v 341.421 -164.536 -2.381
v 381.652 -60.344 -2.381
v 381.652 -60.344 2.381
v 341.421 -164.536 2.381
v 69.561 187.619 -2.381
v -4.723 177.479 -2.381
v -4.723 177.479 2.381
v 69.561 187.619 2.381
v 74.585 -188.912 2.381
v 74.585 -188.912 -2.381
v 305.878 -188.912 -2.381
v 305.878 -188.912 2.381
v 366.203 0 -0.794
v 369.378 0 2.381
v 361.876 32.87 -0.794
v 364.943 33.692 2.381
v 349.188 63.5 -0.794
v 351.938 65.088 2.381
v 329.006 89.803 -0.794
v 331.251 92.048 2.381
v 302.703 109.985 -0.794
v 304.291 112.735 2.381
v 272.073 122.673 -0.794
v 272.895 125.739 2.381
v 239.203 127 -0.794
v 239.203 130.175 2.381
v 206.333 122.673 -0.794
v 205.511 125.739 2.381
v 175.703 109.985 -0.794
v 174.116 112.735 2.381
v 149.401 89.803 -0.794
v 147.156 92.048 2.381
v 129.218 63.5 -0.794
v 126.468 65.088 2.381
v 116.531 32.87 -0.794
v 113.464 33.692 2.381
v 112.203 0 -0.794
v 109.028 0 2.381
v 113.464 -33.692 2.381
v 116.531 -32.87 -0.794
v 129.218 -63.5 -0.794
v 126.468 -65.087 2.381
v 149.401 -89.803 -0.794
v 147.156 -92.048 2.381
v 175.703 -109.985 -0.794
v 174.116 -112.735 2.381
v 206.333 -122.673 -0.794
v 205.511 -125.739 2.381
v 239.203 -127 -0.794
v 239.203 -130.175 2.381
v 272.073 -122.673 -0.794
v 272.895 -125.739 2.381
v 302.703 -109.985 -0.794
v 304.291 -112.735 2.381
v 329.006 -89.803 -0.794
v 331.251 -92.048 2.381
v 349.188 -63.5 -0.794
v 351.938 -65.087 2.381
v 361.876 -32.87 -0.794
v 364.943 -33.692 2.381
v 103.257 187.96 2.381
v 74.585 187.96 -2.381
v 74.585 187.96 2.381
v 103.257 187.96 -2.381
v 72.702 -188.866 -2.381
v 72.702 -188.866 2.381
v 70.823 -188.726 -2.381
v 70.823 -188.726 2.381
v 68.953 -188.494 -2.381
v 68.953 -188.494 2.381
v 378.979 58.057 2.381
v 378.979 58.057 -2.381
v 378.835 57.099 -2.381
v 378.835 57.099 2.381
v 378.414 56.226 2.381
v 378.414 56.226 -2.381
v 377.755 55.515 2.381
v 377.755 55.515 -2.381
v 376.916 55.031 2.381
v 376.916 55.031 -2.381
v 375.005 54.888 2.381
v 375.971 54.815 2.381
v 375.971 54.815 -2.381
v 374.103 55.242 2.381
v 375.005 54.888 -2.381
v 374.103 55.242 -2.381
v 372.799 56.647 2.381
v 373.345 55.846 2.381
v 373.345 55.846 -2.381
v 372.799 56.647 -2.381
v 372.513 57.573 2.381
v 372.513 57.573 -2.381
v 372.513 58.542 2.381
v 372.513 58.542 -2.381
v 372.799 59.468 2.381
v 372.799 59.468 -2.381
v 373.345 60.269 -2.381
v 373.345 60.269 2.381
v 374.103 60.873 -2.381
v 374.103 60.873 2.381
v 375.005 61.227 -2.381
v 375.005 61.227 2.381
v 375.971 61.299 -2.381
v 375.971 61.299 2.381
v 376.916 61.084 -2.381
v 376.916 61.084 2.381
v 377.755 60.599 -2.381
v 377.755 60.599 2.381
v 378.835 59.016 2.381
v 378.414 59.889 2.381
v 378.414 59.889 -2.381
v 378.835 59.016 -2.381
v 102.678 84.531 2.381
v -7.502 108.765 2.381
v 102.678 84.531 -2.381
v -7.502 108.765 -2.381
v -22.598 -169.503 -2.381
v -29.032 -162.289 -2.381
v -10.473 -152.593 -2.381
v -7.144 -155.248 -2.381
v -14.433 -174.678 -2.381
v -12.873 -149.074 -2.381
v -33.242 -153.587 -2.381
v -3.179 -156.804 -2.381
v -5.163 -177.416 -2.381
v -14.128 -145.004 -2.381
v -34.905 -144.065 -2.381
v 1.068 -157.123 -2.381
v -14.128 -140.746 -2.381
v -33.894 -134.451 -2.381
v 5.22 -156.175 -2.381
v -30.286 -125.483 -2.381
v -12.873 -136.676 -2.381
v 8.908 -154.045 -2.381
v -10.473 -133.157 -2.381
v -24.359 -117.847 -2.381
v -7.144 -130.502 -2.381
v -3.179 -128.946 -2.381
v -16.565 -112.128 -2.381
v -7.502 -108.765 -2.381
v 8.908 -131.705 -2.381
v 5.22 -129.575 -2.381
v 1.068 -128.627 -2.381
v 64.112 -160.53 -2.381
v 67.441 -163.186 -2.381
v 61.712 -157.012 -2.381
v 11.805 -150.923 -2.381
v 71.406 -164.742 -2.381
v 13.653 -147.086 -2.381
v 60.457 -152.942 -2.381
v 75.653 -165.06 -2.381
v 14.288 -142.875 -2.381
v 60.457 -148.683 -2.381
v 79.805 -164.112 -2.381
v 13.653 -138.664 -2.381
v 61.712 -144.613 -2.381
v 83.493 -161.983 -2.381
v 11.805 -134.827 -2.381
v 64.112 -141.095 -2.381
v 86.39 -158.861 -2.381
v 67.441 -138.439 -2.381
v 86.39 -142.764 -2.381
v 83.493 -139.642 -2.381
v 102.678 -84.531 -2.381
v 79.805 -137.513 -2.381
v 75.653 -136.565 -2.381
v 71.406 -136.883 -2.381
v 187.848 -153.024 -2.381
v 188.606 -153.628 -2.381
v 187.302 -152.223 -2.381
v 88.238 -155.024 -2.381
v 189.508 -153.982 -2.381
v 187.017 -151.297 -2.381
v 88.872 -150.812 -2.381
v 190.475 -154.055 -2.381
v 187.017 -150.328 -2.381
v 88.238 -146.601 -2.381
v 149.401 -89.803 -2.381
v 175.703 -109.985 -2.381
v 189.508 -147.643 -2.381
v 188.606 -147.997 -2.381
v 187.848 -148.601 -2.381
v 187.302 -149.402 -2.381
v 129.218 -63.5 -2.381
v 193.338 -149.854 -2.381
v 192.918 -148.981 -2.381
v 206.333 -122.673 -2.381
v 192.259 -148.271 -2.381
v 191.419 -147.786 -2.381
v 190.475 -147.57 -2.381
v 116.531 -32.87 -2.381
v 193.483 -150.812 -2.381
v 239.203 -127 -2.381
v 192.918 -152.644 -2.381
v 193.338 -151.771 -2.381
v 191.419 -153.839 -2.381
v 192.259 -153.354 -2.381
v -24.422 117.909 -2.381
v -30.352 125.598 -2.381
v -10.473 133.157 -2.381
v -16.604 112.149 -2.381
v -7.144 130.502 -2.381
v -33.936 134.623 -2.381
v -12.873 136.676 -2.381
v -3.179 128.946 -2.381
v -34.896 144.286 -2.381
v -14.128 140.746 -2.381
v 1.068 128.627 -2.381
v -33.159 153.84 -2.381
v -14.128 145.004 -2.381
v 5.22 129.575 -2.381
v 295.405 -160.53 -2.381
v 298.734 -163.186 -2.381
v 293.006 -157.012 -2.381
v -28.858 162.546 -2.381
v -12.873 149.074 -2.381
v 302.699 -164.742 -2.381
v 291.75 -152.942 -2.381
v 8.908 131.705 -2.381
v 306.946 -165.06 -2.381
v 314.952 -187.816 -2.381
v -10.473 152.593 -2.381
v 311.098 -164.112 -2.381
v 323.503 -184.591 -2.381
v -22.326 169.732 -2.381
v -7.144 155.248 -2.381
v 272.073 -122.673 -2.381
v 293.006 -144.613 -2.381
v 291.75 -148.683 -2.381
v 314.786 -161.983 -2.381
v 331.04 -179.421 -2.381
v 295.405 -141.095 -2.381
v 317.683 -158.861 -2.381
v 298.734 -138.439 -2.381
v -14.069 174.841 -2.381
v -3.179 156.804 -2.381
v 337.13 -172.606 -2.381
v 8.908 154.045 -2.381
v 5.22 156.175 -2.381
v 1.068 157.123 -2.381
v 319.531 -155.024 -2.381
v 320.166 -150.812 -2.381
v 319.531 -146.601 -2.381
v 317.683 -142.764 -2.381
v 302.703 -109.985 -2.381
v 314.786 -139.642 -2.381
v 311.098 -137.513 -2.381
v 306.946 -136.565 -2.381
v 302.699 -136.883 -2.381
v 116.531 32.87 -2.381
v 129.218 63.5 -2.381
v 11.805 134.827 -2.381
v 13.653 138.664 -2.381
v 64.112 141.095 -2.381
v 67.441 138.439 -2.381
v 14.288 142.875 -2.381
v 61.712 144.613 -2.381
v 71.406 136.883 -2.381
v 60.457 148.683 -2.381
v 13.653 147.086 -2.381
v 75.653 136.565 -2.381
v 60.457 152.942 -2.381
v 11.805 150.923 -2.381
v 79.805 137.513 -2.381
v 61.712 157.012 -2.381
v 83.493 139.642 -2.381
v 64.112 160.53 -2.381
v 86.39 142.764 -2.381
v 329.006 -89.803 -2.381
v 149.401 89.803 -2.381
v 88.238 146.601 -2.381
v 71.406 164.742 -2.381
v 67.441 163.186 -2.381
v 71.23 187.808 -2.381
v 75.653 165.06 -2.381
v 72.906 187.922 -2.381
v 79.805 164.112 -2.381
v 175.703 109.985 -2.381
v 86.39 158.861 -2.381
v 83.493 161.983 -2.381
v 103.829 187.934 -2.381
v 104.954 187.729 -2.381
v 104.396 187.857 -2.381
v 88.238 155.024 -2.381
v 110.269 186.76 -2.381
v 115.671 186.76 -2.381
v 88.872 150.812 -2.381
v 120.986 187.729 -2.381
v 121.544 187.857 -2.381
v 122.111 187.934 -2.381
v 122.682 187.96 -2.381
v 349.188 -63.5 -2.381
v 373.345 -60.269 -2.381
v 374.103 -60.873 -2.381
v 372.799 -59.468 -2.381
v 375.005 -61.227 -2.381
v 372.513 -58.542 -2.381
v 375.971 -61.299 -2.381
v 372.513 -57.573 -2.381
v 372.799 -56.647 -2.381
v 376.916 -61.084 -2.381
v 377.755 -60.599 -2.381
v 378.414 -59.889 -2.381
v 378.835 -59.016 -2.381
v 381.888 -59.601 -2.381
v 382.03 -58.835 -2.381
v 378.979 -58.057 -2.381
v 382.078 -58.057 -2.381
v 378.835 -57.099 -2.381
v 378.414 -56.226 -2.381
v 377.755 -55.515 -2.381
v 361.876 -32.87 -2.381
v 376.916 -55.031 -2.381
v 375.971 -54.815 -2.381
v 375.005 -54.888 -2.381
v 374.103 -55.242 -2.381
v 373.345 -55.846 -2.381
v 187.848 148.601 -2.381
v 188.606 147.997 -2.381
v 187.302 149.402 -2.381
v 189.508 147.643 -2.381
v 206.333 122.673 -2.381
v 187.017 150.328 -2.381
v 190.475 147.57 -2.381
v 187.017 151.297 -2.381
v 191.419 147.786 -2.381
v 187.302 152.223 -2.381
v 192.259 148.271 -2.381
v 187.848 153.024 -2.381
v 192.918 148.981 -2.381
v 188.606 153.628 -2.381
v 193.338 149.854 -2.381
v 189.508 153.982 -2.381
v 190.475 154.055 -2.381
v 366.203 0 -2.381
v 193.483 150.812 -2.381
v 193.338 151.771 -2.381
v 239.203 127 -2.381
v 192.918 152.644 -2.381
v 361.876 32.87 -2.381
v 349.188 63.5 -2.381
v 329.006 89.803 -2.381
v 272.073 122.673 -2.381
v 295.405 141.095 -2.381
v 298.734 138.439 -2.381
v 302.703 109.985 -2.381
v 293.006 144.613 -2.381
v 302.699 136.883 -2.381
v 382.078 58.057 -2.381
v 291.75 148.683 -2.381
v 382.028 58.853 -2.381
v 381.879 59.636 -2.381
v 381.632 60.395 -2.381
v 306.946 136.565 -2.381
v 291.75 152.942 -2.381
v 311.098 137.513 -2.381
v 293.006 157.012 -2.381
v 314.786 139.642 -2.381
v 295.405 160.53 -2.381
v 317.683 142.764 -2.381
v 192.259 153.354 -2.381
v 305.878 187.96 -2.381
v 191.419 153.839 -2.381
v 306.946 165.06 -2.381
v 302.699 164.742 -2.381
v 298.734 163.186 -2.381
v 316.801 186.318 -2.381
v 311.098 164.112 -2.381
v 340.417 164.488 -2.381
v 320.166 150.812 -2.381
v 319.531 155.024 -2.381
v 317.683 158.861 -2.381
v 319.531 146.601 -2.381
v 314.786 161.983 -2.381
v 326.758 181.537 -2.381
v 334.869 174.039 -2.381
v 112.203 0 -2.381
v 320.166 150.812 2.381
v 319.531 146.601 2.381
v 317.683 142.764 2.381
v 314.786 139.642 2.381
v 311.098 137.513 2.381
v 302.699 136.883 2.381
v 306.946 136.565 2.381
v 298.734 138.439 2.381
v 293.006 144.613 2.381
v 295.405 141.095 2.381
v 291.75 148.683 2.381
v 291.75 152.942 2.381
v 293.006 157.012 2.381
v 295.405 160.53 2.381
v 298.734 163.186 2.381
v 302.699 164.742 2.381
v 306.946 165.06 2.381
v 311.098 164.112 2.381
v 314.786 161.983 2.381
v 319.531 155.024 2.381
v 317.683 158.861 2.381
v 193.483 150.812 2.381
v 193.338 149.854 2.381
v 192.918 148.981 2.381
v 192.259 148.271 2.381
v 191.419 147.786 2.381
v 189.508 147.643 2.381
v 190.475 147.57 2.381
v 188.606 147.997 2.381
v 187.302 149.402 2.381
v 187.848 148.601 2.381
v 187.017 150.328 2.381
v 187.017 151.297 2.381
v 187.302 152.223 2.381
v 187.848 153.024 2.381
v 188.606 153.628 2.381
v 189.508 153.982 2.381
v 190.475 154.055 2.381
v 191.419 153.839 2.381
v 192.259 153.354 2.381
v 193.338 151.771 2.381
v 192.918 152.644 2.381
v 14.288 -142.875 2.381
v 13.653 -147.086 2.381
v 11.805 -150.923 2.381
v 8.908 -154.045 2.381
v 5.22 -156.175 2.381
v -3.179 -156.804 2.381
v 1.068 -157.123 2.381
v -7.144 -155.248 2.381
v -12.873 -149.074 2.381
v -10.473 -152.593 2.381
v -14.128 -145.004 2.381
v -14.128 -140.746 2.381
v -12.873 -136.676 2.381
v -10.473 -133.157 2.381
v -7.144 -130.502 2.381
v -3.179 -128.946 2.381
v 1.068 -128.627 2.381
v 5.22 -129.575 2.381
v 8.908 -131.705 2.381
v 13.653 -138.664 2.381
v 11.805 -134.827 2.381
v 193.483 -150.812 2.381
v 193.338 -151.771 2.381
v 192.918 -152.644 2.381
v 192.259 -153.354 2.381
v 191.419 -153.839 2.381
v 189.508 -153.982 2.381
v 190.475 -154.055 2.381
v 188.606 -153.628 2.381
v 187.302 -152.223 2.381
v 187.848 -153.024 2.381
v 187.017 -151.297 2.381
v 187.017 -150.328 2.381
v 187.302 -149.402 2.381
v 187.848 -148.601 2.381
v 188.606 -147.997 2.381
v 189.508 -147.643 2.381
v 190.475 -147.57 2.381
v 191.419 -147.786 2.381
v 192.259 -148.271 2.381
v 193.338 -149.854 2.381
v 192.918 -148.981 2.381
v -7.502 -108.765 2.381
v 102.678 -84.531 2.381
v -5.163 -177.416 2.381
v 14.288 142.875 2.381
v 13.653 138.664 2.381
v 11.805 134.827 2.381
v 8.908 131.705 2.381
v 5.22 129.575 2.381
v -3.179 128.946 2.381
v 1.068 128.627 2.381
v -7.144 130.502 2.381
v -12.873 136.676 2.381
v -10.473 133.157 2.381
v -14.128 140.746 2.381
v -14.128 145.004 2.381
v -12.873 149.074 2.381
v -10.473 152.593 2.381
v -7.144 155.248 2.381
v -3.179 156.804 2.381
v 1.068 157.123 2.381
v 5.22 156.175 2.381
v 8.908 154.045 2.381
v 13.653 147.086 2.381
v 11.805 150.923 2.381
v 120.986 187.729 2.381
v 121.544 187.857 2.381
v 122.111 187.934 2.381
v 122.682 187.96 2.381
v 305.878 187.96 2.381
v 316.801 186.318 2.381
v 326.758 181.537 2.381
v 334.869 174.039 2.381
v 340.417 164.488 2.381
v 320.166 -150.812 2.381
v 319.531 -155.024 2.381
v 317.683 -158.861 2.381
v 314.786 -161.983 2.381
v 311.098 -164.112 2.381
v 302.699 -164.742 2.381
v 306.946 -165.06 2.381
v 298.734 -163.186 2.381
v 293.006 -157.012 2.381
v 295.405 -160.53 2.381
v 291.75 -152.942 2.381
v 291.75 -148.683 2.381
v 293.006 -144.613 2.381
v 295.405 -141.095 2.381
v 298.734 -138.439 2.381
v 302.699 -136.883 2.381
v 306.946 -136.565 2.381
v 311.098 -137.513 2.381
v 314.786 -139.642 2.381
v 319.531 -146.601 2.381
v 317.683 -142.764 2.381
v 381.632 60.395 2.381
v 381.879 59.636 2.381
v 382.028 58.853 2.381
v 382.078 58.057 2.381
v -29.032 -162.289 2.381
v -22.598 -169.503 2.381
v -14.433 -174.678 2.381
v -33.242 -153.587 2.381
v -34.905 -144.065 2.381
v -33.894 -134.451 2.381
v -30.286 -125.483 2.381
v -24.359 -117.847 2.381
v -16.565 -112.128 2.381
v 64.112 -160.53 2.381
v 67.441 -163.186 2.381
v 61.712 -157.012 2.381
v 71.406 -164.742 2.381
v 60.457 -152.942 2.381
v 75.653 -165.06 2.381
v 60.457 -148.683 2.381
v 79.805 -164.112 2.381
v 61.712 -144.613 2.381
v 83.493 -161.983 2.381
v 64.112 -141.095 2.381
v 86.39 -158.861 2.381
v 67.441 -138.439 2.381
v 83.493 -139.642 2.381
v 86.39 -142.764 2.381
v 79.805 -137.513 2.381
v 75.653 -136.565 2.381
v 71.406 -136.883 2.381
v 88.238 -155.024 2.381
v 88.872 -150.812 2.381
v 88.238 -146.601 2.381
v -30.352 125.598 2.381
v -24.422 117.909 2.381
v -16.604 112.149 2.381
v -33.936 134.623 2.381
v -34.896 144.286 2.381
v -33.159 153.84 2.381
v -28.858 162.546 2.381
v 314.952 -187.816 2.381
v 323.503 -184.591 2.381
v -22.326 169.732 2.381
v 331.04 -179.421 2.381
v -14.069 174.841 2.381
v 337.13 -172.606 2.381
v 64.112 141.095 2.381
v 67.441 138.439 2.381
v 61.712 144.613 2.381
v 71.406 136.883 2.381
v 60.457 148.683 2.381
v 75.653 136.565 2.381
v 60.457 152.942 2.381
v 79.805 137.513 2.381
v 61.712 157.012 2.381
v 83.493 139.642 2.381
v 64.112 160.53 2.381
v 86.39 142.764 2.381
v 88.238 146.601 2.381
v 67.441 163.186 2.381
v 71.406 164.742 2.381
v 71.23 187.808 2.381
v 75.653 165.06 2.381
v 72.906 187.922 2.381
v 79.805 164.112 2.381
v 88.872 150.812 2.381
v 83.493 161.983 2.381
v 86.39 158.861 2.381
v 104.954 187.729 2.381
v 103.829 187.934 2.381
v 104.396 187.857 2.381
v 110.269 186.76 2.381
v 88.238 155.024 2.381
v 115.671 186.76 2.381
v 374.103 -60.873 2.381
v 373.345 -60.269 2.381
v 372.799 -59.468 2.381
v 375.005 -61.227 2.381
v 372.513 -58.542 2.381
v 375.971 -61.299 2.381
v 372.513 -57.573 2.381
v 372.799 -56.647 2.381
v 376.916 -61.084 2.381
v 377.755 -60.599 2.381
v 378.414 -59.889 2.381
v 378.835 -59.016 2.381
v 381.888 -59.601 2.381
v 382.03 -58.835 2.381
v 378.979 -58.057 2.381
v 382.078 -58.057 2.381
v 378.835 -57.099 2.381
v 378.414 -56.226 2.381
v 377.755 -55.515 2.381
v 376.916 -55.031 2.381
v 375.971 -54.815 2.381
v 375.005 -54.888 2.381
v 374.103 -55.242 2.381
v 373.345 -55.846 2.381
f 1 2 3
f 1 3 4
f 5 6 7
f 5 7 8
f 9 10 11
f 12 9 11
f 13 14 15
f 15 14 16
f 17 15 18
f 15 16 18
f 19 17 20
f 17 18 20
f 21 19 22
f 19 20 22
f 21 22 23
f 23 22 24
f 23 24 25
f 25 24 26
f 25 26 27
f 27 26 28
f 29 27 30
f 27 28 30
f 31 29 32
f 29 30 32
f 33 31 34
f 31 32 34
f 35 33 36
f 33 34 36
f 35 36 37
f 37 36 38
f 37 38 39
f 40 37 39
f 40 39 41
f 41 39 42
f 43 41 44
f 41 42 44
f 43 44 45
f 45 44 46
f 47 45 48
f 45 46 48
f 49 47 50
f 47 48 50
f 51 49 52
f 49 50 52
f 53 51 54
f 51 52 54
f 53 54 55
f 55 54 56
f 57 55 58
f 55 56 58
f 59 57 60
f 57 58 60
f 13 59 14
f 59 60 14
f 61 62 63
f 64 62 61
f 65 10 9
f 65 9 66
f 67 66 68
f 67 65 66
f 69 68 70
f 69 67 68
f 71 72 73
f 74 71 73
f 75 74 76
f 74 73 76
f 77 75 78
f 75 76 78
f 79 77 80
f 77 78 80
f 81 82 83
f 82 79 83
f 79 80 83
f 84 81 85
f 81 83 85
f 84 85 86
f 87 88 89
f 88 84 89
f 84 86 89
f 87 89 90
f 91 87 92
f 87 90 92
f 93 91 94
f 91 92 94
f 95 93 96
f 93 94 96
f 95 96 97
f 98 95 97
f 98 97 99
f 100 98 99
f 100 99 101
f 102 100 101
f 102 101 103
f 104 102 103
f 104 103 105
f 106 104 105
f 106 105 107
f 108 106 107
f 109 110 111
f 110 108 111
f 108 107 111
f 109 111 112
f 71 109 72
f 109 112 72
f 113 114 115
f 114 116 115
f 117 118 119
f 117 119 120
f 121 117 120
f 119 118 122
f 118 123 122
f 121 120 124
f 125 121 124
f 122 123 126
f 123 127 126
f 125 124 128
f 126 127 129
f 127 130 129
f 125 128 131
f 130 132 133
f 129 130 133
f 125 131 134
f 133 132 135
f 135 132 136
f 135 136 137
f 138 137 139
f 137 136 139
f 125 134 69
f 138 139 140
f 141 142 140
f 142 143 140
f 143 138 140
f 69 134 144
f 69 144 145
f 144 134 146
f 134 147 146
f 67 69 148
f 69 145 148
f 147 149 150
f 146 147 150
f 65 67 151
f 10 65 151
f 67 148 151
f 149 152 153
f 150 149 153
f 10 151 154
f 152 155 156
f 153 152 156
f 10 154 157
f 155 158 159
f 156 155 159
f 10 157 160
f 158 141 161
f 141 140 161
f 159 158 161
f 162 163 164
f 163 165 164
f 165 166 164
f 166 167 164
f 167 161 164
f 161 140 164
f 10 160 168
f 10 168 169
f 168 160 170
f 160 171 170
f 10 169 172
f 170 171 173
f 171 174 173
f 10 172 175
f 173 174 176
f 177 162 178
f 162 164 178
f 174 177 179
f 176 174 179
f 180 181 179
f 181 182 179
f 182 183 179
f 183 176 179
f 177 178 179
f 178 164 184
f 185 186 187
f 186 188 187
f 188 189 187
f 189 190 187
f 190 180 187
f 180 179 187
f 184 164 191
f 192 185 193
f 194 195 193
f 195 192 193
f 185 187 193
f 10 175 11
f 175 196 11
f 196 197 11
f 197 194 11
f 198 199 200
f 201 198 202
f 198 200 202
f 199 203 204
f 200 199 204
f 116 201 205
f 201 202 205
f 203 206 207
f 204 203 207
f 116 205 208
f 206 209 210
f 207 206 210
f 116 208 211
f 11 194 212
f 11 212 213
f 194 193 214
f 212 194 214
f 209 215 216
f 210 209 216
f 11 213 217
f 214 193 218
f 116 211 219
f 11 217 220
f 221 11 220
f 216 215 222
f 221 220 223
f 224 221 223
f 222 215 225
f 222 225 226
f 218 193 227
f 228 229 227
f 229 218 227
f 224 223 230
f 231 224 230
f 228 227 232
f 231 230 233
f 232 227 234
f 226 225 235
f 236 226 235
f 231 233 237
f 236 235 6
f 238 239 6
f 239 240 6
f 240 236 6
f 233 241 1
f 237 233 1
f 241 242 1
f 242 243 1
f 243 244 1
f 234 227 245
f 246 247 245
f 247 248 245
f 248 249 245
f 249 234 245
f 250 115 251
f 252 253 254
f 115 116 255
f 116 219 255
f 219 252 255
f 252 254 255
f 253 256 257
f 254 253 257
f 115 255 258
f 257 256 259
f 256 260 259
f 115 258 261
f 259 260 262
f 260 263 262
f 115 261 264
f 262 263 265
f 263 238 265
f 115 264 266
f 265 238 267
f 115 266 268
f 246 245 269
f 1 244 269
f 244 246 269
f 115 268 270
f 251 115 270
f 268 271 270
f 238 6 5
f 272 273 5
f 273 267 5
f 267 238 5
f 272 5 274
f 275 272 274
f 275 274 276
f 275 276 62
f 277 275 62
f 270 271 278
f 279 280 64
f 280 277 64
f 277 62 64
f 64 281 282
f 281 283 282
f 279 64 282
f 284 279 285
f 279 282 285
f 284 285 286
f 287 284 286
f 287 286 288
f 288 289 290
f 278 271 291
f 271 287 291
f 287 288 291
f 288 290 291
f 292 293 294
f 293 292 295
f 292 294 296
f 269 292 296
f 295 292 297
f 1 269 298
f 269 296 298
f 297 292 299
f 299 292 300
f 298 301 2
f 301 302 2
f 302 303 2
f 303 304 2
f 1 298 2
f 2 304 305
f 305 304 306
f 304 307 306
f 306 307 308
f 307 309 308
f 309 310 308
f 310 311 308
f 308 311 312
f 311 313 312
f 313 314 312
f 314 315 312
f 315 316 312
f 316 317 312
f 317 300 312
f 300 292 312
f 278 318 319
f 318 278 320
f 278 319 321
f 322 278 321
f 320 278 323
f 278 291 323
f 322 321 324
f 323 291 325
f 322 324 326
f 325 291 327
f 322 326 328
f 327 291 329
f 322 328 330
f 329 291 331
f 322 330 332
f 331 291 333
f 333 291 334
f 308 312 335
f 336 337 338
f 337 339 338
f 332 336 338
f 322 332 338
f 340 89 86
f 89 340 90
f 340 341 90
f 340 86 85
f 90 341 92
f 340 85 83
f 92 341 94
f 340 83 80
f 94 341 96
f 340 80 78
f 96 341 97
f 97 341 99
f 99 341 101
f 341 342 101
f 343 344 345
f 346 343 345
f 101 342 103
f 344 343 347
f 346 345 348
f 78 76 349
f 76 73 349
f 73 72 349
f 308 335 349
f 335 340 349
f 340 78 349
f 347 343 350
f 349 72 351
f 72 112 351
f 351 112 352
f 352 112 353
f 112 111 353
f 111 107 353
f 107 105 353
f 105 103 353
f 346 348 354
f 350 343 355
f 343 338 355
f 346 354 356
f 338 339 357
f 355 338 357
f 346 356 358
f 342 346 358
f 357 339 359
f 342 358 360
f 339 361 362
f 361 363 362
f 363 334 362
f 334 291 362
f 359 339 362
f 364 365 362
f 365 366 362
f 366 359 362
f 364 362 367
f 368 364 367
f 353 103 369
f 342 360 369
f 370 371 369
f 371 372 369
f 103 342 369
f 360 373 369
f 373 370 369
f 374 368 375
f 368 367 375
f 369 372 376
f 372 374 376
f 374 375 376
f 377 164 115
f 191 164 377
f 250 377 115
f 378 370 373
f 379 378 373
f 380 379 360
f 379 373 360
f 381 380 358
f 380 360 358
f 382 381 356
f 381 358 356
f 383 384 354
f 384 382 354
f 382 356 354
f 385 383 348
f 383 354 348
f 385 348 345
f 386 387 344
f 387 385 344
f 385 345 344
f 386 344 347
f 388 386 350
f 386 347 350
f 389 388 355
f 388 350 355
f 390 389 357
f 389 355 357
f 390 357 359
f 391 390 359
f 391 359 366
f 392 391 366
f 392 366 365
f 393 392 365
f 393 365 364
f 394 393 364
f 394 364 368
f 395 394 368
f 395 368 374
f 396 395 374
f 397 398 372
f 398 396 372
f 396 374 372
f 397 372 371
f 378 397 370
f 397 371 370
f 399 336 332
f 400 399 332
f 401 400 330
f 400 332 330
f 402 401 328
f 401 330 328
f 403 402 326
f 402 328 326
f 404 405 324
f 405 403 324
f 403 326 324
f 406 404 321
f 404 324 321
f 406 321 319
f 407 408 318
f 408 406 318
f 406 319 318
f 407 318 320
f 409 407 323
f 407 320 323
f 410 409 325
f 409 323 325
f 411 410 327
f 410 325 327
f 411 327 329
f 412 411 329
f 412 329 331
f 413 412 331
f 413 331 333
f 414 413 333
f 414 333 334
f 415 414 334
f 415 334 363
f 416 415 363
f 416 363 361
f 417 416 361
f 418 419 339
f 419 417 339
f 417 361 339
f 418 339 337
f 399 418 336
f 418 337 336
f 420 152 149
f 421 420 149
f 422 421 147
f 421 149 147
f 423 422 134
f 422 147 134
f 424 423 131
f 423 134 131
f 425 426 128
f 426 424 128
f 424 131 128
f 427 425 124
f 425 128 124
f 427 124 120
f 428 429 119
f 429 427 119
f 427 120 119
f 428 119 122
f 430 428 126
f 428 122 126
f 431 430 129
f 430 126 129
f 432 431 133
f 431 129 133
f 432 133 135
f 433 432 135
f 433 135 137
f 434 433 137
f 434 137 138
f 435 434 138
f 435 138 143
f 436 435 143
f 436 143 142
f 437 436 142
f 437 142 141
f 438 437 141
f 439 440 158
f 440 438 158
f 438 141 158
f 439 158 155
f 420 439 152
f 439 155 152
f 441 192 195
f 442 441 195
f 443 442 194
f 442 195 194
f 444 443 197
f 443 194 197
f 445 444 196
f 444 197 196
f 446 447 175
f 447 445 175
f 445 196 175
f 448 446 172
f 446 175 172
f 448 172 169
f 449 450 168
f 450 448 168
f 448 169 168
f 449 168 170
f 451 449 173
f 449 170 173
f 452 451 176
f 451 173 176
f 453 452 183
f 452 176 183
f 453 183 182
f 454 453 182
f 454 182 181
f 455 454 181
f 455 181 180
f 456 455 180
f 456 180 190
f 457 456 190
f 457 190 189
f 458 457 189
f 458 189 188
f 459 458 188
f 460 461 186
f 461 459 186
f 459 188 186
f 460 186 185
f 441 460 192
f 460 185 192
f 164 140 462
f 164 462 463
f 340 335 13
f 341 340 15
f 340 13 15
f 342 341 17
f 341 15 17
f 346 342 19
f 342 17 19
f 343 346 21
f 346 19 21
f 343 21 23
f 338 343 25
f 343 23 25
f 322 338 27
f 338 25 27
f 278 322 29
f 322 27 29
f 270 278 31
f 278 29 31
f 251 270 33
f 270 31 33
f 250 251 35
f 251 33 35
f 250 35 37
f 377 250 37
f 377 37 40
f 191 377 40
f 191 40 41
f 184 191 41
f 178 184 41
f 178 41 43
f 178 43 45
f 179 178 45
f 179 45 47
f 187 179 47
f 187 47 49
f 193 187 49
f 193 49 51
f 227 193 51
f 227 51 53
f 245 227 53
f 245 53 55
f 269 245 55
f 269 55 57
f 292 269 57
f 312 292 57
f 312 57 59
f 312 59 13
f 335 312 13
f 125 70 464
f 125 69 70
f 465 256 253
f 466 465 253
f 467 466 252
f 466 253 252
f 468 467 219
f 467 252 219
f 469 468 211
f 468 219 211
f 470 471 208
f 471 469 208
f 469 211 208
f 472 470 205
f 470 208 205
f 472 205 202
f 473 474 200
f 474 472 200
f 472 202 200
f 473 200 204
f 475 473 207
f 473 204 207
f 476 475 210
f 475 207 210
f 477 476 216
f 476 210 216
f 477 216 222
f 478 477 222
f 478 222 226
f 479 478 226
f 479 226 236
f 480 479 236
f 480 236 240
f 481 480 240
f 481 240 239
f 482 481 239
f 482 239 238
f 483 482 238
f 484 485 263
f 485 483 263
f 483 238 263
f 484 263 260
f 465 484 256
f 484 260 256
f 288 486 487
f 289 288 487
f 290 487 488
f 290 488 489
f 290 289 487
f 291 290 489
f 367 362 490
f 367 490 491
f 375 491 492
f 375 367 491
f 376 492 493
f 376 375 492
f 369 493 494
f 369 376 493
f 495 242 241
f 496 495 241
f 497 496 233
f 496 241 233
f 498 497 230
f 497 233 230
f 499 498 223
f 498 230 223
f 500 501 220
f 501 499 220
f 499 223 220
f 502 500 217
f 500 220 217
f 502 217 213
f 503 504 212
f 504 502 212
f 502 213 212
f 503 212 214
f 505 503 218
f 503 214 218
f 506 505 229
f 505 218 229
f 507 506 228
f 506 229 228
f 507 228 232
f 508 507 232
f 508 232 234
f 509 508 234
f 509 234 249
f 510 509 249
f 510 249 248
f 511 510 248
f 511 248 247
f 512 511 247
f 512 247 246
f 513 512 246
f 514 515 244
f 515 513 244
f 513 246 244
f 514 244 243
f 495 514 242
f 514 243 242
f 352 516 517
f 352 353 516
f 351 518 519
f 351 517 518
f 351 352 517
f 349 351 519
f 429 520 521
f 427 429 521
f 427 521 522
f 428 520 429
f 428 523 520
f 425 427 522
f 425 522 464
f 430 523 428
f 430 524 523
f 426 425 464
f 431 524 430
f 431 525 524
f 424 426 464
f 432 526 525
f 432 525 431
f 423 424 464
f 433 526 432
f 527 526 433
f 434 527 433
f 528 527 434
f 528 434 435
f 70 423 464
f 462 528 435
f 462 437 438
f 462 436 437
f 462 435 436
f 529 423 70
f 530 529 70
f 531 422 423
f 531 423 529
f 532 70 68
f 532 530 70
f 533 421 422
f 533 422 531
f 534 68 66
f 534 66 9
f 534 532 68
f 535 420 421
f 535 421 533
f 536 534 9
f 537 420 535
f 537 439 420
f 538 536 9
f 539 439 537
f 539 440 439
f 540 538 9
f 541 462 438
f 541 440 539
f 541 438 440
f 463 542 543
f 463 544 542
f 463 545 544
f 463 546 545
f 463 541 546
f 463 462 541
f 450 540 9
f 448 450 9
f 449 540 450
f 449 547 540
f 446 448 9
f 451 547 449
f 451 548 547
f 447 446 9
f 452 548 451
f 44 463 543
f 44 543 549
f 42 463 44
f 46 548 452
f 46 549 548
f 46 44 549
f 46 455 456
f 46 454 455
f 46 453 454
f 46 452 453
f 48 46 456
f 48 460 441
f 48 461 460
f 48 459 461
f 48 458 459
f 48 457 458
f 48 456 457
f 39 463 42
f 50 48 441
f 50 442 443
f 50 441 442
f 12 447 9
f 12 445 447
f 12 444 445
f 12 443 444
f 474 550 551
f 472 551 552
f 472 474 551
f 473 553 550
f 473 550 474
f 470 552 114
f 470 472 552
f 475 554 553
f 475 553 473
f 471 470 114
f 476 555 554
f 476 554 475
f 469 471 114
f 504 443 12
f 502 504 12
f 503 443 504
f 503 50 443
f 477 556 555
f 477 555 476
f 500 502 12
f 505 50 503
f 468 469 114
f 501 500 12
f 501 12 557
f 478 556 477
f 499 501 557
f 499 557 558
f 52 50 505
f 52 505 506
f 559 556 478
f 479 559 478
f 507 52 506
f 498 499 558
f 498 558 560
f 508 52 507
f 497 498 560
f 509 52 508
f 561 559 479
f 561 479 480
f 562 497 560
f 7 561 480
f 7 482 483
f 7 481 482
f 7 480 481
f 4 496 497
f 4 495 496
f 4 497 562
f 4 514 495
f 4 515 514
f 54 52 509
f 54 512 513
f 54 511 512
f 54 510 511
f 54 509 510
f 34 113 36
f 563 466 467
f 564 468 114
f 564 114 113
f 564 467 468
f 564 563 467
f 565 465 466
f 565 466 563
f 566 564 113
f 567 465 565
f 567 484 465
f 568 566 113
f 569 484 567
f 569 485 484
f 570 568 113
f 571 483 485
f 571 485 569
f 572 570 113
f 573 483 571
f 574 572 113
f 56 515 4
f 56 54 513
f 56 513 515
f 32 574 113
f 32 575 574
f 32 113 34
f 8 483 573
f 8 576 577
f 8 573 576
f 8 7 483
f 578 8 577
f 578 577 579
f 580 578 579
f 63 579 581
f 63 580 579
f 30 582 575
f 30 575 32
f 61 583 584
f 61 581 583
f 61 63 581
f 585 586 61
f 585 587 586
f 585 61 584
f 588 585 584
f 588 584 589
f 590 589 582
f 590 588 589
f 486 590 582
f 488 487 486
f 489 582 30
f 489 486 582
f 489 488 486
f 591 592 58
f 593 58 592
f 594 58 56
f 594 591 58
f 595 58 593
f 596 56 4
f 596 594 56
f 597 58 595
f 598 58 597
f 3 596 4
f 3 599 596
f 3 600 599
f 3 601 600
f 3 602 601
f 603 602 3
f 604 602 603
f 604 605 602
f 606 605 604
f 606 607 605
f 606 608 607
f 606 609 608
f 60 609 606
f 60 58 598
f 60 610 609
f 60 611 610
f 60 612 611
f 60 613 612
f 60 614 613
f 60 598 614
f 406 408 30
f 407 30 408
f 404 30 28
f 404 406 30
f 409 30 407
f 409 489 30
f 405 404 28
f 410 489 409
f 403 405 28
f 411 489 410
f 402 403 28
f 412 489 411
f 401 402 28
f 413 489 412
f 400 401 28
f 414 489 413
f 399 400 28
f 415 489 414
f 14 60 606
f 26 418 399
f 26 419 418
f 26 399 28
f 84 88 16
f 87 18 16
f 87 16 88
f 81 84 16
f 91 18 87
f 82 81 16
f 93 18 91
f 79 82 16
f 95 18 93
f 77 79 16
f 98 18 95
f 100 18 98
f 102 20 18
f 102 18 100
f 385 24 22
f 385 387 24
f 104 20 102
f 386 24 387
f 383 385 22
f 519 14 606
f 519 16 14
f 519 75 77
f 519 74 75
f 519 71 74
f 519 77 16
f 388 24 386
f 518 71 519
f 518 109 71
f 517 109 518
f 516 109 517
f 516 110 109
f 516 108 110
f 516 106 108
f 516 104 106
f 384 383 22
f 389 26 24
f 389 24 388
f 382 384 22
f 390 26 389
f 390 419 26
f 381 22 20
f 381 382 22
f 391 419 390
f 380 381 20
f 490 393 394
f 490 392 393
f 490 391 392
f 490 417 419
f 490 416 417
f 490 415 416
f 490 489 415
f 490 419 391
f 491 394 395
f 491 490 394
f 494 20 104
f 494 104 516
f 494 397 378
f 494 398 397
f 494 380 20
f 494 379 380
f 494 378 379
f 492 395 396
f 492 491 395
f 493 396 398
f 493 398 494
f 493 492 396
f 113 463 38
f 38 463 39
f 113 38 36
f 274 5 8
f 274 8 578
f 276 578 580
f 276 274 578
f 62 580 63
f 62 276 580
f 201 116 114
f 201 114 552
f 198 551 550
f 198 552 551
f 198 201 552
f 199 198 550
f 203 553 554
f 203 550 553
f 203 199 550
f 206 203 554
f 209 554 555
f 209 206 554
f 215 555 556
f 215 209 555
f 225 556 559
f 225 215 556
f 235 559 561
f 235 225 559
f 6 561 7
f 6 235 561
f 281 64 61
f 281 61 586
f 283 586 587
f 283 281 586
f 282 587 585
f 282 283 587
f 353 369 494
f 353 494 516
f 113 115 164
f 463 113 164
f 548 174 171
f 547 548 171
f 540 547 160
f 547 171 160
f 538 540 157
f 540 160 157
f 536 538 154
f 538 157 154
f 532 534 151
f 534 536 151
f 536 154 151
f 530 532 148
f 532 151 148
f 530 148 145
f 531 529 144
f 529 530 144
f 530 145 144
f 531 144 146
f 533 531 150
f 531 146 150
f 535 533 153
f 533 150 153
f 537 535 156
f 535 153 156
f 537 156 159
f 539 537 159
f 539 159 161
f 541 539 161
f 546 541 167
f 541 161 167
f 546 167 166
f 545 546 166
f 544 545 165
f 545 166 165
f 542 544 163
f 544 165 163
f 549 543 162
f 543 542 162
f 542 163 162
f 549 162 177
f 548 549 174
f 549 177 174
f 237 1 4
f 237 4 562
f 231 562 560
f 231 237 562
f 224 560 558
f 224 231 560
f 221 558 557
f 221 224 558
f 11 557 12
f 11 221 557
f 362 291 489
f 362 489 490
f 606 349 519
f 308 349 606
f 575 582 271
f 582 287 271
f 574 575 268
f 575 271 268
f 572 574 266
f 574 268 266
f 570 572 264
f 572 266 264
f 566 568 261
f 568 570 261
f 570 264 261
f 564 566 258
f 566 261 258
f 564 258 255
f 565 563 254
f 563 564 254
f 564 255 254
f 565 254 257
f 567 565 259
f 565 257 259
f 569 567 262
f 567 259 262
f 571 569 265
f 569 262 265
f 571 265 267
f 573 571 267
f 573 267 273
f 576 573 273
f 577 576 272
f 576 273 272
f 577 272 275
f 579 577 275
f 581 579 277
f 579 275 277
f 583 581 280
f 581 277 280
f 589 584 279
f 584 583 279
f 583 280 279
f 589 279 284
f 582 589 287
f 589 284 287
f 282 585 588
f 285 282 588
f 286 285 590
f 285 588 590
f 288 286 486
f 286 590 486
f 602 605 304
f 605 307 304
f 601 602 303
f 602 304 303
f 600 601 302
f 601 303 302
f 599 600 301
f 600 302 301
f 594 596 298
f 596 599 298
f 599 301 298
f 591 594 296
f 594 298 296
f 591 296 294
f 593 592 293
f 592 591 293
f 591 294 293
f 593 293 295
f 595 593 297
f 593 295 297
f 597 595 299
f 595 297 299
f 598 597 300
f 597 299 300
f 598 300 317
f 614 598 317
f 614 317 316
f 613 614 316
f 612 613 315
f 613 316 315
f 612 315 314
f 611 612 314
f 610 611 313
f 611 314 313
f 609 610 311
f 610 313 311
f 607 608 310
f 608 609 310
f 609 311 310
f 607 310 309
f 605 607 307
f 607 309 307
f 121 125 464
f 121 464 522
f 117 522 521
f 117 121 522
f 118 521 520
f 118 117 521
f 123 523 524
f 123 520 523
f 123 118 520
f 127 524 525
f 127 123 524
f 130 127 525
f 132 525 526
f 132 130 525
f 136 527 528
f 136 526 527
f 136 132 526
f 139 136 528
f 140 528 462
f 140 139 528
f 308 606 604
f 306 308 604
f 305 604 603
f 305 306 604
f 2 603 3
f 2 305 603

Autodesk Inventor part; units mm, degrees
ref_plane "YZ Plane" through (0, 0, 0) normal (1, 0, 0) x (0, 1, 0)
ref_plane "XZ Plane" through (0, 0, 0) normal (0, 1, 0) x (-1, 0, 0)
ref_plane "XY Plane" through (0, 0, 0) normal (0, 0, 1) x (1, 0, 0)
sketch "Sketch1" plane through (0, 0, 0) normal (0, 0, 1) x (1, 0, 0)
  circle A0 centre (0, 142.875) radius 63.5 construction
  circle A1 centre (0, 142.875) radius 25.4 construction
  circle A2 centre (0, -142.875) radius 25.4 construction
  circle A3 centre (0, -142.875) radius 63.5 construction
  line L0 (0, 79.375) -> (0, 79.375) construction
  line L1 (0, -79.375) -> (0, -79.375) construction
  line L2 (0, 0) -> (229.6782, 0) construction
  line L3 (0, 142.875) -> (305.8782, 142.875) construction
  line L4 (305.8782, 142.875) -> (305.8782, -142.875) construction
  line L5 (305.8782, -142.875) -> (0, -142.875) construction
  circle A4 centre (229.6782, 0) radius 127 construction
  circle A5 centre (0, 142.875) radius 14.2875
  circle A6 centre (0, -142.875) radius 14.2875
  circle A7 centre (0, 142.875) radius 34.925 construction
  circle A8 centre (0, -142.875) radius 34.925 construction
  circle A9 centre (74.585, -150.8125) radius 22.225 construction
  circle A10 centre (74.585, -150.8125) radius 33.3375 construction
  circle A11 centre (74.585, -150.8125) radius 11.1125 construction
  line L6 (74.585, -139.7) -> (74.585, -128.5875) construction
  line L7 (74.585, -117.475) -> (74.585, -128.5875) construction
  circle A12 centre (305.8782, -150.8125) radius 33.3375 construction
  circle A13 centre (305.8782, -150.8125) radius 14.2875
  circle A14 centre (375.7282, 58.0572) radius 6.35 construction
  circle A15 centre (375.7282, -58.0572) radius 6.35 construction
  line L8 (305.8782, 150.8125) -> (375.7282, 58.0572) construction
  line L9 (375.7282, 58.0572) -> (375.7282, -58.0572) construction
  line L10 (375.7282, -58.0572) -> (305.8782, -150.8125) construction
  line L11 (-117.6668, 84.5312) -> (102.6782, 84.5312) construction
  line L12 (102.6782, 84.5312) -> (102.6782, -84.5312) construction
  line L13 (102.6782, -84.5312) -> (-117.6668, -84.5312) construction
  line L14 (-117.6668, -84.5312) -> (-117.6668, 84.5312) construction
  line L15 (0, 142.875) -> (0, 84.5312) construction
  line L16 (0, -84.5312) -> (0, -142.875) construction
  circle A16 centre (74.585, -150.8125) radius 14.2875
  line L17 (74.585, -117.475) -> (305.8782, -117.475) construction
  circle A17 centre (74.585, 0) radius 127 construction
  circle A18 centre (0, 0) radius 127 construction
  circle A19 centre (0, 142.875) radius 6.35 construction
  circle A20 centre (74.585, 150.8125) radius 33.3375 construction
  circle A21 centre (305.8782, 150.8125) radius 33.3375 construction
  circle A22 centre (305.8782, 150.8125) radius 14.2875
  circle A23 centre (74.585, 150.8125) radius 14.2875
  circle A24 centre (74.585, 150.8125) radius 37.1475 construction
  circle A25 centre (305.8782, 150.8125) radius 37.1475 construction
  circle A26 centre (305.8782, -150.8125) radius 38.1 construction
  circle A27 centre (74.585, -150.8125) radius 38.1 construction
  line L18 (-4.7233, 177.4791) -> (69.5611, 187.6187)
  line L19 (74.585, 187.96) -> (305.8782, 187.96)
  line L20 (340.4169, 164.488) -> (381.6323, 60.3949)
  line L21 (382.0782, 58.0572) -> (382.0782, -58.0572)
  line L22 (68.953, -188.4939) -> (-5.1627, -177.4163)
  line L23 (221.4945, -245.7989) -> (238.8691, -293.5353) construction
  line L24 (238.8691, -293.5353) -> (382.0782, -241.4114) construction
  line L25 (382.0782, -241.4114) -> (364.7036, -193.675) construction
  line L26 (364.7036, -193.675) -> (221.4945, -245.7989) construction
  line L27 (-7.5024, -108.7653) -> (102.6782, -84.5312)
  line L28 (-7.5024, 108.7653) -> (102.6782, 84.5312)
  line L29 (102.6782, 84.5312) -> (102.6782, -84.5312)
  circle A28 centre (239.2032, 0) radius 127
  line L30 (102.6782, 0) -> (112.2032, 0)
  line L31 (375.7282, 0) -> (366.2032, 0)
  circle A29 centre (221.4945, -245.7989) radius 3.2512 construction
  circle A30 centre (269.2308, -228.4242) radius 3.2512 construction
  circle A31 centre (316.9672, -211.0496) radius 3.2512 construction
  circle A32 centre (364.7036, -193.675) radius 3.2512 construction
  circle A33 centre (238.8691, -293.5353) radius 3.2512 construction
  circle A34 centre (286.6055, -276.1606) radius 3.2512 construction
  circle A35 centre (334.3418, -258.786) radius 3.2512 construction
  circle A36 centre (382.0782, -241.4114) radius 3.2512 construction
  line L32 (74.585, -188.9125) -> (305.8782, -188.9125)
  line L33 (381.652, -60.3445) -> (341.4207, -164.5364)
  arc A37 (-4.7233, 177.4791) -> (-7.5024, 108.7653) centre (0, 142.875) ccw
  arc A38 (74.585, 187.96) -> (69.5611, 187.6187) centre (74.585, 150.8125) ccw
  arc A39 (340.4169, 164.488) -> (305.8782, 187.96) centre (305.8782, 150.8125) ccw
  arc A40 (382.0782, 58.0572) -> (381.6323, 60.3949) centre (375.7282, 58.0572) ccw
  arc A41 (381.652, -60.3445) -> (382.0782, -58.0572) centre (375.7282, -58.0572) ccw
  arc A42 (305.8782, -188.9125) -> (341.4207, -164.5364) centre (305.8782, -150.8125) ccw
  arc A43 (68.953, -188.4939) -> (74.585, -188.9125) centre (74.585, -150.8125) ccw
  arc A44 (-7.5024, -108.7653) -> (-5.1627, -177.4163) centre (0, -142.875) ccw
  circle A45 centre (375.7282, 58.0572) radius 3.2512
  circle A46 centre (375.7282, -58.0572) radius 3.2512
  circle A47 centre (190.2316, 150.8125) radius 3.2512
  line L34 (74.585, 150.8125) -> (190.2316, 150.8125) construction
  line L35 (190.2316, 150.8125) -> (305.8782, 150.8125) construction
  circle A48 centre (190.2316, -150.8125) radius 3.2512
  point P0 (0, 117.475)
  point P1 (0, -117.475)
  point P2 (305.8782, 0)
  point P3 (229.6782, -127)
  point P4 (229.6782, -127)
  point P5 (356.6782, 0)
  point P6 (0, 127)
  point P7 (0, 117.475)
  point P8 (0, 136.525)
  dimension "d1" = 50.8
  dimension "d16" = 44.45
  dimension "d20" = 22.225
  dimension "d33" = 12.7
  dimension "d0" = 127
  dimension "d3" = 285.75
  dimension "d4" = 254
  dimension "d6" = 158.75
  dimension "d7" = 234.95
  dimension "d11" = 28.575
  dimension "d12" = 28.575
  dimension "d13" = 69.85
  dimension "d14" = 69.85
  dimension "d19" = 76.2
  dimension "d24" = 28.575
  dimension "d26" = 12.7
  dimension "d27" = 12.7
  dimension "d28" = 19.05
  dimension "d29" = 220.345
  dimension "d30" = 169.0624
  dimension "d31" = 9.525
  dimension "d32" = 75.0062
  dimension "d34" = 9.525
  dimension "d35" = 19.05
  dimension "d37" = 3.81
  dimension "d38" = 3.81
  dimension "d39" = 4.7625
  dimension "d40" = 4.7625
  dimension "d43" = 20
  dimension "d44" = 6.5024
  dimension "d47" = 50.8
  dimension "d50" = 50.8
  dimension "d53" = 50.8
  dimension "d56" = 6.5024
  dimension "d57" = 6.5024
  dimension "d58" = 6.5024
  dimension "d108" = 231.2932
extrude "Extrusion1" add sketch "Sketch1" along normal mid plane 4.7625
sketch "Sketch2" plane through (0, 0, -2.3813) normal (0, 0, -1) x (-1, 0, 0)
  line L0 (7.5024, -108.7653) -> (-102.6782, -84.5312) projected
  line L1 (-102.6782, -84.5312) -> (-102.6782, 84.5312) projected
  line L2 (-102.6782, 84.5312) -> (7.5024, 108.7653) projected
  arc A0 (7.5024, 108.7653) -> (4.7233, 177.4791) centre (0, 142.875) ccw projected
  line L3 (4.7233, 177.4791) -> (-69.5611, 187.6187) projected
  arc A1 (-69.5611, 187.6187) -> (-74.585, 187.96) centre (-74.585, 150.8125) ccw projected
  line L4 (-74.585, 187.96) -> (-305.8782, 187.96) projected
  arc A2 (-305.8782, 187.96) -> (-340.4169, 164.488) centre (-305.8782, 150.8125) ccw projected
  line L5 (-340.4169, 164.488) -> (-381.6323, 60.3949) projected
  arc A3 (-381.6323, 60.3949) -> (-382.0782, 58.0572) centre (-375.7282, 58.0572) ccw projected
  line L6 (-382.0782, 58.0572) -> (-382.0782, -58.0572) projected
  arc A4 (-382.0782, -58.0572) -> (-381.652, -60.3445) centre (-375.7282, -58.0572) ccw projected
  line L7 (-381.652, -60.3445) -> (-341.4207, -164.5364) projected
  arc A5 (-341.4207, -164.5364) -> (-305.8782, -188.9125) centre (-305.8782, -150.8125) ccw projected
  line L8 (-305.8782, -188.9125) -> (-74.585, -188.9125) projected
  arc A6 (-74.585, -188.9125) -> (-68.953, -188.4939) centre (-74.585, -150.8125) ccw projected
  line L9 (-68.953, -188.4939) -> (5.1627, -177.4163) projected
  arc A7 (5.1627, -177.4163) -> (7.5024, -108.7653) centre (0, -142.875) ccw projected
  circle A8 centre (-239.2032, 0) radius 127 projected
  circle A9 centre (-74.585, -150.8125) radius 14.2875 projected
  circle A10 centre (-74.585, 150.8125) radius 14.2875 projected
  circle A11 centre (-190.2316, 150.8125) radius 3.2512 projected
  circle A12 centre (-190.2316, -150.8125) radius 3.2512 projected
  circle A13 centre (-375.7282, -58.0572) radius 3.2512 projected
  circle A14 centre (-375.7282, 58.0572) radius 3.2512 projected
  circle A15 centre (-305.8782, 150.8125) radius 14.2875 projected
  circle A16 centre (-305.8782, -150.8125) radius 14.2875 projected
  circle A17 centre (0, -142.875) radius 14.2875 projected
  circle A18 centre (0, 142.875) radius 14.2875 projected
  line L10 (-107.4407, -88.36) -> (6.4793, -113.4166)
  arc A19 (4.4587, -172.7061) -> (6.4793, -113.4166) centre (0, -142.875) ccw
  line L11 (4.4587, -172.7061) -> (-69.657, -183.7838)
  arc A20 (-74.585, -184.15) -> (-69.657, -183.7838) centre (-74.585, -150.8125) ccw
  line L12 (-74.585, -184.15) -> (-305.8782, -184.15)
  arc A21 (-336.9779, -162.8209) -> (-305.8782, -184.15) centre (-305.8782, -150.8125) ccw
  line L13 (-336.9779, -162.8209) -> (-377.2092, -58.6291)
  arc A22 (-377.3157, -58.0572) -> (-377.2092, -58.6291) centre (-375.7282, -58.0572) ccw
  line L14 (-377.3157, -58.0572) -> (-377.3157, 58.0572)
  arc A23 (-377.2042, 58.6416) -> (-377.3157, 58.0572) centre (-375.7282, 58.0572) ccw
  line L15 (-377.2042, 58.6416) -> (-335.9888, 162.7347)
  arc A24 (-305.8782, 183.1975) -> (-335.9888, 162.7347) centre (-305.8782, 150.8125) ccw
  line L16 (-305.8782, 183.1975) -> (-74.585, 183.1975)
  arc A25 (-70.2052, 182.9) -> (-74.585, 183.1975) centre (-74.585, 150.8125) ccw
  line L17 (-70.2052, 182.9) -> (4.0793, 172.7604)
  arc A26 (6.4793, 113.4166) -> (4.0793, 172.7604) centre (0, 142.875) ccw
  line L18 (6.4793, 113.4166) -> (-107.4407, 88.36)
  line L19 (-107.4407, 88.36) -> (-107.4407, -88.36)
  circle A27 centre (-239.2032, 0) radius 133.35
  circle A28 centre (-74.585, 150.8125) radius 19.05
  circle A29 centre (0, 142.875) radius 19.05
  circle A30 centre (-190.2316, 150.8125) radius 8.0137
  circle A31 centre (-305.8782, 150.8125) radius 19.05
  circle A32 centre (-375.7282, 58.0572) radius 8.0137
  circle A33 centre (-375.7282, -58.0572) radius 8.0137
  circle A34 centre (-305.8782, -150.8125) radius 19.05
  circle A35 centre (-190.2316, -150.8125) radius 8.0137
  circle A36 centre (-74.585, -150.8125) radius 19.05
  circle A37 centre (0, -142.875) radius 19.05
  line L20 (0, -142.875) -> (-74.585, -150.8125)
  line L21 (-74.585, -150.8125) -> (-71.7613, -188.8077)
  line L22 (-74.585, -150.8125) -> (-102.6782, -84.5312)
  line L23 (-74.585, -150.8125) -> (-190.2316, -150.8125)
  line L24 (-190.2316, -150.8125) -> (-190.2316, -188.9125)
  line L25 (-190.2316, -150.8125) -> (-305.8782, -150.8125)
  line L26 (-305.8782, -150.8125) -> (-327.4274, -182.233)
  line L27 (-102.6782, -84.5312) -> (-239.2032, 0)
  line L28 (-239.2032, 0) -> (-190.2316, -150.8125)
  line L29 (-305.8782, -150.8125) -> (-239.2032, 0)
  line L30 (-239.2032, 0) -> (-375.7282, -58.0572)
  line L31 (-239.2032, 0) -> (-375.7282, 58.0572)
  line L32 (-375.7282, 58.0572) -> (-305.8782, 150.8125)
  line L33 (-305.8782, 150.8125) -> (-190.2316, 150.8125)
  line L34 (-190.2316, 150.8125) -> (-74.585, 150.8125)
  line L35 (-74.585, 150.8125) -> (0, 142.875)
  line L36 (-102.6782, -84.5312) -> (-190.2316, -150.8125)
  line L37 (-305.8782, -150.8125) -> (-375.7282, -58.0572)
  line L38 (-102.6782, 84.5312) -> (-74.585, 150.8125)
  line L39 (-102.6782, 84.5312) -> (-190.2316, 150.8125)
  line L40 (-102.6782, 84.5312) -> (-239.2032, 0)
  line L41 (-239.2032, 0) -> (-190.2316, 150.8125)
  line L42 (-239.2032, 0) -> (-305.8782, 150.8125)
  line L43 (-4.7625, -138.5924) -> (-75.089, -146.0767)
  line L44 (-68.936, -151.9364) -> (-99.5574, -79.6902)
  line L45 (0, -142.875) -> (0, -111.9915)
  line L46 (-4.7625, -110.944) -> (-4.7625, -138.5924)
  line L47 (0, 142.875) -> (0, 111.9915)
  line L48 (-99.5574, 79.6902) -> (-68.936, 151.9364)
  line L49 (-108.3272, 83.4073) -> (-77.7058, 155.6535)
  line L50 (-190.2316, 146.05) -> (-74.585, 146.05)
  line L51 (-98.0687, 87.0149) -> (-189.092, 155.923)
  line L52 (-105.1853, 88.5804) -> (-241.7103, 4.0492)
  line L53 (-103.8179, 79.4207) -> (-194.8411, 148.3288)
  line L54 (-235.7016, -4.6369) -> (-184.6739, 152.5077)
  line L55 (-244.761, -1.6952) -> (-193.7332, 155.4494)
  line L56 (-305.8782, 146.05) -> (-190.2316, 146.05)
  line L57 (-233.5511, -1.0064) -> (-302.8187, 155.6703)
  line L58 (-242.2627, -4.8578) -> (-311.5303, 151.8189)
  line L59 (-300.8665, 149.5508) -> (-368.2605, 60.0568)
  line L60 (-368.2605, 60.0568) -> (-236.9729, 4.2268)
  line L61 (-240.7003, -4.5386) -> (-383.1959, 56.0576)
  line L62 (-383.1959, 56.0576) -> (-308.4753, 155.2807)
  line L63 (-240.7003, 4.5386) -> (-383.1959, -56.0576)
  line L64 (-383.1959, -56.0576) -> (-308.4753, -155.2807)
  line L65 (-236.9729, -4.2268) -> (-368.2605, -60.0568)
  line L66 (-368.2605, -60.0568) -> (-300.8665, -149.5508)
  line L67 (-311.5303, -151.8189) -> (-242.2627, 4.8578)
  line L68 (-244.761, 1.6952) -> (-193.7332, -155.4494)
  line L69 (-235.7016, 4.6369) -> (-184.6739, -152.5077)
  line L70 (-302.8187, -155.6703) -> (-233.5511, 1.0064)
  line L71 (-105.1853, -88.5804) -> (-241.7103, -4.0492)
  line L72 (-100.1711, -80.482) -> (-236.6961, 4.0492)
  line L73 (-100.1711, 80.482) -> (-236.6961, -4.0492)
  line L74 (-77.7058, -155.6535) -> (-108.3272, -83.4073)
  line L75 (-105.5995, -80.7694) -> (-196.6227, -149.6775)
  line L76 (-98.0687, -87.0149) -> (-189.092, -155.923)
  line L77 (-74.585, -146.05) -> (-190.2316, -146.05)
  line L78 (-190.2316, -146.05) -> (-305.8782, -146.05)
  line L79 (-75.089, 146.0767) -> (-4.7625, 138.5924)
  line L80 (-4.7625, 138.5924) -> (-4.7625, 110.944)
  arc A38 (-377.3157, -6.35) -> (-372.4074, -6.2352) centre (-374.8602, -6.35) ccw
  arc A39 (-372.4074, 6.2352) -> (-377.3157, 6.35) centre (-374.8602, 6.35) ccw
  line L81 (-239.2032, 0) -> (-366.2032, 0)
  point P0 (0, 0)
  dimension "d59" = 4.7625
  dimension "d60" = 6.35
  dimension "d61" = 4.7625
  dimension "d62" = 4.7625
  dimension "d63" = 4.7625
  dimension "d64" = 4.7625
  dimension "d65" = 4.7625
  dimension "d66" = 4.7625
  dimension "d67" = 4.7625
  dimension "d68" = 4.7625
  dimension "d69" = 4.7625
  dimension "d70" = 4.7625
  dimension "d71" = 4.7625
  dimension "d72" = 4.7625
  dimension "d73" = 4.7625
  dimension "d75" = 4.7625
  dimension "d76" = 4.7625
  dimension "d77" = 4.7625
  dimension "d78" = 4.7625
  dimension "d79" = 4.7625
  dimension "d80" = 4.7625
  dimension "d81" = 4.7625
  dimension "d82" = 4.7625
  dimension "d83" = 4.7625
  dimension "d84" = 4.7625
  dimension "d85" = 4.7625
  dimension "d86" = 4.7625
  dimension "d87" = 4.7625
  dimension "d88" = 4.7625
  dimension "d89" = 4.7625
  dimension "d90" = 4.7625
  dimension "d91" = 4.7625
  dimension "d92" = 4.7625
  dimension "d93" = 4.7625
  dimension "d94" = 4.7625
  dimension "d95" = 4.7625
  dimension "d96" = 4.7625
  dimension "d97" = 4.7625
  dimension "d98" = 4.7625
  dimension "d99" = 4.7625
  dimension "d100" = 4.7625
  dimension "d101" = 4.7625
  dimension "d102" = 4.7625
  dimension "d103" = 4.7625
  dimension "d104" = 12.7
chamfer "Chamfer1" distance 3.175 distance2 3.175 1 edges at (112.2032, 0, 2.3813) measured on face at (190.101, -177.2883, 2.3812)
sketch "Sketch3" plane through (0, 0, 2.3813) normal (0, 0, 1) x (1, 0, 0)
  line L0 (305.8782, 187.96) -> (74.585, 187.96) projected
  arc A0 (104.1636, 187.96) -> (121.7761, 187.96) centre (112.9698, 216.6384) ccw
  circle A1 centre (117.1583, 219.0822) radius 4 projected
  circle A2 centre (112.9698, 216.6384) radius 2.0193 projected
  point P0 (0, 0)
  dimension "d109" = 30
extrude "Extrusion2" cut sketch "Sketch3" against normal blind 25.4 contours A0 L0
fillet "Fillet1" radius 6.35 2 edges at (104.1636, 187.96, 0) (121.7761, 187.96, 0)
properties part number "OUTK_002_ShotPlateReceptacle" material "Aluminum 6061"
